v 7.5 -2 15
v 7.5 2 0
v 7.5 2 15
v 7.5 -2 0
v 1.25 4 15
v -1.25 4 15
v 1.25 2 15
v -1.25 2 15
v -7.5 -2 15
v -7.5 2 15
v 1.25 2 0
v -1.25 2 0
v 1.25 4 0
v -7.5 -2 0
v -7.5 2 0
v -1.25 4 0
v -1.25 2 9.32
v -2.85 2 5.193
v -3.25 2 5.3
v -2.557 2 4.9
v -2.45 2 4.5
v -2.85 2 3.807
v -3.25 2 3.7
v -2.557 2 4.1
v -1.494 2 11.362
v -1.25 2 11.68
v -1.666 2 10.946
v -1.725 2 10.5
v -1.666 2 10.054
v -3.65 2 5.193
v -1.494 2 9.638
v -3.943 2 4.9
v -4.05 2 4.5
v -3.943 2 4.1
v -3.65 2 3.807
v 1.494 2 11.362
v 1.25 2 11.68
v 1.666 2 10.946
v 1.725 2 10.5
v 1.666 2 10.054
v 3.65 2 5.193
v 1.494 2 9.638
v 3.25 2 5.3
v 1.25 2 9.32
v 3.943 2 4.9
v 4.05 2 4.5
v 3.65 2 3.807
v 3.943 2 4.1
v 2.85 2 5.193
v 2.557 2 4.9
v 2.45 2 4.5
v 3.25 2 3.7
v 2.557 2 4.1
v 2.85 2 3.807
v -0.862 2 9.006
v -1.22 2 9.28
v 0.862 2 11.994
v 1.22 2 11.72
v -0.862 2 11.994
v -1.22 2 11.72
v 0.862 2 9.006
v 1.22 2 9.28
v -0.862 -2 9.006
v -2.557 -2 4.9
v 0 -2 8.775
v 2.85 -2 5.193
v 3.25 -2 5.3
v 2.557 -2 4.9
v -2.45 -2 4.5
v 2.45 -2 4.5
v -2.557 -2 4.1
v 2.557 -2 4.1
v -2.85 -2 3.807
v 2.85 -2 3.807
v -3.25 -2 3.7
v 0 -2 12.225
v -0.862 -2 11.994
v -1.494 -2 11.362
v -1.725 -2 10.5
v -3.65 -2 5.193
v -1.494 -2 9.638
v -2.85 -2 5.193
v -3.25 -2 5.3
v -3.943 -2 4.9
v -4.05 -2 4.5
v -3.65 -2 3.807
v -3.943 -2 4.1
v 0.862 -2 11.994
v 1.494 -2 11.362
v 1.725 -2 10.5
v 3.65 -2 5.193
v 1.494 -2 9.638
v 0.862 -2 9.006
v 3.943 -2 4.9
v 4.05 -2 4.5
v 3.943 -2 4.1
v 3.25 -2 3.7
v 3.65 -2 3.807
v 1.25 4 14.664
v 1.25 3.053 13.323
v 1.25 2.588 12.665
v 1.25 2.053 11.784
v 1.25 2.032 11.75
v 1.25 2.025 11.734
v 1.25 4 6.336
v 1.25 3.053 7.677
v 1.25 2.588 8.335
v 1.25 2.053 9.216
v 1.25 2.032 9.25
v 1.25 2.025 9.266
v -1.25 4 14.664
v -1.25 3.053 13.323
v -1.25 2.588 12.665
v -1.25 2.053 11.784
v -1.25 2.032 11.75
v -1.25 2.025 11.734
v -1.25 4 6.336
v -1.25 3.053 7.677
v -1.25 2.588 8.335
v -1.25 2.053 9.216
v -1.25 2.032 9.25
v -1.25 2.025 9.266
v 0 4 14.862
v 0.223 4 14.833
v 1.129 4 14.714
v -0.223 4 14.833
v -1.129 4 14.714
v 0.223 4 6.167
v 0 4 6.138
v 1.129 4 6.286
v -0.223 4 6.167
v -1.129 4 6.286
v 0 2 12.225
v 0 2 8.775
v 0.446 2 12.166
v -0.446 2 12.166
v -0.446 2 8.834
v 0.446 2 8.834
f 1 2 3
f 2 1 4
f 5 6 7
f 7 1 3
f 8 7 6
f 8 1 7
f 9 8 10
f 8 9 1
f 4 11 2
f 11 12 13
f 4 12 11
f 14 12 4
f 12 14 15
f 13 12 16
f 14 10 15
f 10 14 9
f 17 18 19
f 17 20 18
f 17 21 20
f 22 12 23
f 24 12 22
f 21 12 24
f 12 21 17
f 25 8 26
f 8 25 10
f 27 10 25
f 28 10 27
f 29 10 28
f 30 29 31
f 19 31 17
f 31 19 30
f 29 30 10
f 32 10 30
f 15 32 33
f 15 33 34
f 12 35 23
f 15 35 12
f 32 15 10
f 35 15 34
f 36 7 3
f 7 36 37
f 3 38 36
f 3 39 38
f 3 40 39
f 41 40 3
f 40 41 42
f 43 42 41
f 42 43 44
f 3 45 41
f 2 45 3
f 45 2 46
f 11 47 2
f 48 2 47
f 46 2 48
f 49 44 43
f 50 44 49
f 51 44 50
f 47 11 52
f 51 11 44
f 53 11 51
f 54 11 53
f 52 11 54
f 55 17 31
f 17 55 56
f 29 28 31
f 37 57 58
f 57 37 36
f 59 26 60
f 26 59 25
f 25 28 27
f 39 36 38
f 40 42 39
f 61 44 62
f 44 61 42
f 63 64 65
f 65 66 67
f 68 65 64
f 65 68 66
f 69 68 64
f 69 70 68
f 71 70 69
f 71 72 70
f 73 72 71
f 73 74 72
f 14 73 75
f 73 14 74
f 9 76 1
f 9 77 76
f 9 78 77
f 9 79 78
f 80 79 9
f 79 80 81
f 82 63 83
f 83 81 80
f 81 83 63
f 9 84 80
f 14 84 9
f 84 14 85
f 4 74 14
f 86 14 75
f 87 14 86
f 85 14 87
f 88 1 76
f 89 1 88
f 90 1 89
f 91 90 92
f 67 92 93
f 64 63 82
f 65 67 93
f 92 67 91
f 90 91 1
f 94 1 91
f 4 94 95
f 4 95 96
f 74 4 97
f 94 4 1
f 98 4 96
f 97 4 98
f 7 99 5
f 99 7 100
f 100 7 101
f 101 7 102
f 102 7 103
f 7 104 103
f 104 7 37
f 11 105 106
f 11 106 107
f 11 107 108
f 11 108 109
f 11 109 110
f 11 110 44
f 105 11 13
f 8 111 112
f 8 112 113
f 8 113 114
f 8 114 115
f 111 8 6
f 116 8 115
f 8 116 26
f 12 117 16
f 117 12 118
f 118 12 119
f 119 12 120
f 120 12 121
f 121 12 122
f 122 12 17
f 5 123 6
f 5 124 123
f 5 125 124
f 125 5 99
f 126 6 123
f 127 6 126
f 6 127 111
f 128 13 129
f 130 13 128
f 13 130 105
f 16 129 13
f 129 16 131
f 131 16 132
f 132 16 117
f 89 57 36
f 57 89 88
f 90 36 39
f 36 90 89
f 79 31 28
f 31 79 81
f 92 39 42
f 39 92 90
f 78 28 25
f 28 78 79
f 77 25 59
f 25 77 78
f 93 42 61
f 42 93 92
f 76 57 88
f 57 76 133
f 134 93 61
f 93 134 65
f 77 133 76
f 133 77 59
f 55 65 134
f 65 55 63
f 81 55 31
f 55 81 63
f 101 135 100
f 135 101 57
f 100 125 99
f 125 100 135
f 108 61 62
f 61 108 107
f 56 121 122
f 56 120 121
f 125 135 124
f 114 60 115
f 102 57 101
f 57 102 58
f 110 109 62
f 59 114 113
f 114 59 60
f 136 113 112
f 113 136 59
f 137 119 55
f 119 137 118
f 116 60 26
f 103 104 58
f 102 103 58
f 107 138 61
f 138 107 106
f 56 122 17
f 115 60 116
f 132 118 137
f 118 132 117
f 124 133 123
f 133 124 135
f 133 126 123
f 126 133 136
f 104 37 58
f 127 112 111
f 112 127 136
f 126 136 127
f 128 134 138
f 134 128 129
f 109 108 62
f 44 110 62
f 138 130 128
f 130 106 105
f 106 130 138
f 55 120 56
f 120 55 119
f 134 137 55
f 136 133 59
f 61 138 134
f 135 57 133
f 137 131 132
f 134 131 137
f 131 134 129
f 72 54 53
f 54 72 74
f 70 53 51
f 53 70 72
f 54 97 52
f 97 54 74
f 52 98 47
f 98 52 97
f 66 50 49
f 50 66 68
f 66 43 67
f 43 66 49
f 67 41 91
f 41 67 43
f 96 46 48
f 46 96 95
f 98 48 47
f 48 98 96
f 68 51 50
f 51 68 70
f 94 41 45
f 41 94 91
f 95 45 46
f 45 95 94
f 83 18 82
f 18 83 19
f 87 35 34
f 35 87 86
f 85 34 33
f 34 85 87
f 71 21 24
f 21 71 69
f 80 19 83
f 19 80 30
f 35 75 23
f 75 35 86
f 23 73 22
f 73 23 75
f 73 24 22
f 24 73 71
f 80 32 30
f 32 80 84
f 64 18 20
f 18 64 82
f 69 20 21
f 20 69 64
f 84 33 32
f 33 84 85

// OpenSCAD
thickness = 4;  // 1mm thicker than linear rail.
width = 15;  // Same as vertical extrusion.
height = 15;

m3_wide_radius = 2.85/2 + 0.1 + 0.2;

module endstop() {
  difference() {
    union() {
      cube([width, thickness, height], center=true);
      translate([0, 2, 0])
        cube([2.5, thickness, height], center=true);
    }
    translate([0, 0, 3]) rotate([90, 0, 0]) {
      cylinder(r=m3_wide_radius, h=20, center=true, $fn=12);
      translate([0, 0, -thickness/2]) scale([1, 1, -1])
        cylinder(r1=m3_wide_radius, r2=7, h=4, $fn=24);
    }
    translate([0, -3-thickness/2, -3]) rotate([0, 180, 0]) {
      for (x = [-6.5/2, 6.5/2]) {
        translate([x, 0, 0]) rotate([90, 0, 0])
          cylinder(r=1.6/2, h=40, center=true, $fn=12);
      }
    }
  }
}

translate([0, 0, height/2]) endstop();
